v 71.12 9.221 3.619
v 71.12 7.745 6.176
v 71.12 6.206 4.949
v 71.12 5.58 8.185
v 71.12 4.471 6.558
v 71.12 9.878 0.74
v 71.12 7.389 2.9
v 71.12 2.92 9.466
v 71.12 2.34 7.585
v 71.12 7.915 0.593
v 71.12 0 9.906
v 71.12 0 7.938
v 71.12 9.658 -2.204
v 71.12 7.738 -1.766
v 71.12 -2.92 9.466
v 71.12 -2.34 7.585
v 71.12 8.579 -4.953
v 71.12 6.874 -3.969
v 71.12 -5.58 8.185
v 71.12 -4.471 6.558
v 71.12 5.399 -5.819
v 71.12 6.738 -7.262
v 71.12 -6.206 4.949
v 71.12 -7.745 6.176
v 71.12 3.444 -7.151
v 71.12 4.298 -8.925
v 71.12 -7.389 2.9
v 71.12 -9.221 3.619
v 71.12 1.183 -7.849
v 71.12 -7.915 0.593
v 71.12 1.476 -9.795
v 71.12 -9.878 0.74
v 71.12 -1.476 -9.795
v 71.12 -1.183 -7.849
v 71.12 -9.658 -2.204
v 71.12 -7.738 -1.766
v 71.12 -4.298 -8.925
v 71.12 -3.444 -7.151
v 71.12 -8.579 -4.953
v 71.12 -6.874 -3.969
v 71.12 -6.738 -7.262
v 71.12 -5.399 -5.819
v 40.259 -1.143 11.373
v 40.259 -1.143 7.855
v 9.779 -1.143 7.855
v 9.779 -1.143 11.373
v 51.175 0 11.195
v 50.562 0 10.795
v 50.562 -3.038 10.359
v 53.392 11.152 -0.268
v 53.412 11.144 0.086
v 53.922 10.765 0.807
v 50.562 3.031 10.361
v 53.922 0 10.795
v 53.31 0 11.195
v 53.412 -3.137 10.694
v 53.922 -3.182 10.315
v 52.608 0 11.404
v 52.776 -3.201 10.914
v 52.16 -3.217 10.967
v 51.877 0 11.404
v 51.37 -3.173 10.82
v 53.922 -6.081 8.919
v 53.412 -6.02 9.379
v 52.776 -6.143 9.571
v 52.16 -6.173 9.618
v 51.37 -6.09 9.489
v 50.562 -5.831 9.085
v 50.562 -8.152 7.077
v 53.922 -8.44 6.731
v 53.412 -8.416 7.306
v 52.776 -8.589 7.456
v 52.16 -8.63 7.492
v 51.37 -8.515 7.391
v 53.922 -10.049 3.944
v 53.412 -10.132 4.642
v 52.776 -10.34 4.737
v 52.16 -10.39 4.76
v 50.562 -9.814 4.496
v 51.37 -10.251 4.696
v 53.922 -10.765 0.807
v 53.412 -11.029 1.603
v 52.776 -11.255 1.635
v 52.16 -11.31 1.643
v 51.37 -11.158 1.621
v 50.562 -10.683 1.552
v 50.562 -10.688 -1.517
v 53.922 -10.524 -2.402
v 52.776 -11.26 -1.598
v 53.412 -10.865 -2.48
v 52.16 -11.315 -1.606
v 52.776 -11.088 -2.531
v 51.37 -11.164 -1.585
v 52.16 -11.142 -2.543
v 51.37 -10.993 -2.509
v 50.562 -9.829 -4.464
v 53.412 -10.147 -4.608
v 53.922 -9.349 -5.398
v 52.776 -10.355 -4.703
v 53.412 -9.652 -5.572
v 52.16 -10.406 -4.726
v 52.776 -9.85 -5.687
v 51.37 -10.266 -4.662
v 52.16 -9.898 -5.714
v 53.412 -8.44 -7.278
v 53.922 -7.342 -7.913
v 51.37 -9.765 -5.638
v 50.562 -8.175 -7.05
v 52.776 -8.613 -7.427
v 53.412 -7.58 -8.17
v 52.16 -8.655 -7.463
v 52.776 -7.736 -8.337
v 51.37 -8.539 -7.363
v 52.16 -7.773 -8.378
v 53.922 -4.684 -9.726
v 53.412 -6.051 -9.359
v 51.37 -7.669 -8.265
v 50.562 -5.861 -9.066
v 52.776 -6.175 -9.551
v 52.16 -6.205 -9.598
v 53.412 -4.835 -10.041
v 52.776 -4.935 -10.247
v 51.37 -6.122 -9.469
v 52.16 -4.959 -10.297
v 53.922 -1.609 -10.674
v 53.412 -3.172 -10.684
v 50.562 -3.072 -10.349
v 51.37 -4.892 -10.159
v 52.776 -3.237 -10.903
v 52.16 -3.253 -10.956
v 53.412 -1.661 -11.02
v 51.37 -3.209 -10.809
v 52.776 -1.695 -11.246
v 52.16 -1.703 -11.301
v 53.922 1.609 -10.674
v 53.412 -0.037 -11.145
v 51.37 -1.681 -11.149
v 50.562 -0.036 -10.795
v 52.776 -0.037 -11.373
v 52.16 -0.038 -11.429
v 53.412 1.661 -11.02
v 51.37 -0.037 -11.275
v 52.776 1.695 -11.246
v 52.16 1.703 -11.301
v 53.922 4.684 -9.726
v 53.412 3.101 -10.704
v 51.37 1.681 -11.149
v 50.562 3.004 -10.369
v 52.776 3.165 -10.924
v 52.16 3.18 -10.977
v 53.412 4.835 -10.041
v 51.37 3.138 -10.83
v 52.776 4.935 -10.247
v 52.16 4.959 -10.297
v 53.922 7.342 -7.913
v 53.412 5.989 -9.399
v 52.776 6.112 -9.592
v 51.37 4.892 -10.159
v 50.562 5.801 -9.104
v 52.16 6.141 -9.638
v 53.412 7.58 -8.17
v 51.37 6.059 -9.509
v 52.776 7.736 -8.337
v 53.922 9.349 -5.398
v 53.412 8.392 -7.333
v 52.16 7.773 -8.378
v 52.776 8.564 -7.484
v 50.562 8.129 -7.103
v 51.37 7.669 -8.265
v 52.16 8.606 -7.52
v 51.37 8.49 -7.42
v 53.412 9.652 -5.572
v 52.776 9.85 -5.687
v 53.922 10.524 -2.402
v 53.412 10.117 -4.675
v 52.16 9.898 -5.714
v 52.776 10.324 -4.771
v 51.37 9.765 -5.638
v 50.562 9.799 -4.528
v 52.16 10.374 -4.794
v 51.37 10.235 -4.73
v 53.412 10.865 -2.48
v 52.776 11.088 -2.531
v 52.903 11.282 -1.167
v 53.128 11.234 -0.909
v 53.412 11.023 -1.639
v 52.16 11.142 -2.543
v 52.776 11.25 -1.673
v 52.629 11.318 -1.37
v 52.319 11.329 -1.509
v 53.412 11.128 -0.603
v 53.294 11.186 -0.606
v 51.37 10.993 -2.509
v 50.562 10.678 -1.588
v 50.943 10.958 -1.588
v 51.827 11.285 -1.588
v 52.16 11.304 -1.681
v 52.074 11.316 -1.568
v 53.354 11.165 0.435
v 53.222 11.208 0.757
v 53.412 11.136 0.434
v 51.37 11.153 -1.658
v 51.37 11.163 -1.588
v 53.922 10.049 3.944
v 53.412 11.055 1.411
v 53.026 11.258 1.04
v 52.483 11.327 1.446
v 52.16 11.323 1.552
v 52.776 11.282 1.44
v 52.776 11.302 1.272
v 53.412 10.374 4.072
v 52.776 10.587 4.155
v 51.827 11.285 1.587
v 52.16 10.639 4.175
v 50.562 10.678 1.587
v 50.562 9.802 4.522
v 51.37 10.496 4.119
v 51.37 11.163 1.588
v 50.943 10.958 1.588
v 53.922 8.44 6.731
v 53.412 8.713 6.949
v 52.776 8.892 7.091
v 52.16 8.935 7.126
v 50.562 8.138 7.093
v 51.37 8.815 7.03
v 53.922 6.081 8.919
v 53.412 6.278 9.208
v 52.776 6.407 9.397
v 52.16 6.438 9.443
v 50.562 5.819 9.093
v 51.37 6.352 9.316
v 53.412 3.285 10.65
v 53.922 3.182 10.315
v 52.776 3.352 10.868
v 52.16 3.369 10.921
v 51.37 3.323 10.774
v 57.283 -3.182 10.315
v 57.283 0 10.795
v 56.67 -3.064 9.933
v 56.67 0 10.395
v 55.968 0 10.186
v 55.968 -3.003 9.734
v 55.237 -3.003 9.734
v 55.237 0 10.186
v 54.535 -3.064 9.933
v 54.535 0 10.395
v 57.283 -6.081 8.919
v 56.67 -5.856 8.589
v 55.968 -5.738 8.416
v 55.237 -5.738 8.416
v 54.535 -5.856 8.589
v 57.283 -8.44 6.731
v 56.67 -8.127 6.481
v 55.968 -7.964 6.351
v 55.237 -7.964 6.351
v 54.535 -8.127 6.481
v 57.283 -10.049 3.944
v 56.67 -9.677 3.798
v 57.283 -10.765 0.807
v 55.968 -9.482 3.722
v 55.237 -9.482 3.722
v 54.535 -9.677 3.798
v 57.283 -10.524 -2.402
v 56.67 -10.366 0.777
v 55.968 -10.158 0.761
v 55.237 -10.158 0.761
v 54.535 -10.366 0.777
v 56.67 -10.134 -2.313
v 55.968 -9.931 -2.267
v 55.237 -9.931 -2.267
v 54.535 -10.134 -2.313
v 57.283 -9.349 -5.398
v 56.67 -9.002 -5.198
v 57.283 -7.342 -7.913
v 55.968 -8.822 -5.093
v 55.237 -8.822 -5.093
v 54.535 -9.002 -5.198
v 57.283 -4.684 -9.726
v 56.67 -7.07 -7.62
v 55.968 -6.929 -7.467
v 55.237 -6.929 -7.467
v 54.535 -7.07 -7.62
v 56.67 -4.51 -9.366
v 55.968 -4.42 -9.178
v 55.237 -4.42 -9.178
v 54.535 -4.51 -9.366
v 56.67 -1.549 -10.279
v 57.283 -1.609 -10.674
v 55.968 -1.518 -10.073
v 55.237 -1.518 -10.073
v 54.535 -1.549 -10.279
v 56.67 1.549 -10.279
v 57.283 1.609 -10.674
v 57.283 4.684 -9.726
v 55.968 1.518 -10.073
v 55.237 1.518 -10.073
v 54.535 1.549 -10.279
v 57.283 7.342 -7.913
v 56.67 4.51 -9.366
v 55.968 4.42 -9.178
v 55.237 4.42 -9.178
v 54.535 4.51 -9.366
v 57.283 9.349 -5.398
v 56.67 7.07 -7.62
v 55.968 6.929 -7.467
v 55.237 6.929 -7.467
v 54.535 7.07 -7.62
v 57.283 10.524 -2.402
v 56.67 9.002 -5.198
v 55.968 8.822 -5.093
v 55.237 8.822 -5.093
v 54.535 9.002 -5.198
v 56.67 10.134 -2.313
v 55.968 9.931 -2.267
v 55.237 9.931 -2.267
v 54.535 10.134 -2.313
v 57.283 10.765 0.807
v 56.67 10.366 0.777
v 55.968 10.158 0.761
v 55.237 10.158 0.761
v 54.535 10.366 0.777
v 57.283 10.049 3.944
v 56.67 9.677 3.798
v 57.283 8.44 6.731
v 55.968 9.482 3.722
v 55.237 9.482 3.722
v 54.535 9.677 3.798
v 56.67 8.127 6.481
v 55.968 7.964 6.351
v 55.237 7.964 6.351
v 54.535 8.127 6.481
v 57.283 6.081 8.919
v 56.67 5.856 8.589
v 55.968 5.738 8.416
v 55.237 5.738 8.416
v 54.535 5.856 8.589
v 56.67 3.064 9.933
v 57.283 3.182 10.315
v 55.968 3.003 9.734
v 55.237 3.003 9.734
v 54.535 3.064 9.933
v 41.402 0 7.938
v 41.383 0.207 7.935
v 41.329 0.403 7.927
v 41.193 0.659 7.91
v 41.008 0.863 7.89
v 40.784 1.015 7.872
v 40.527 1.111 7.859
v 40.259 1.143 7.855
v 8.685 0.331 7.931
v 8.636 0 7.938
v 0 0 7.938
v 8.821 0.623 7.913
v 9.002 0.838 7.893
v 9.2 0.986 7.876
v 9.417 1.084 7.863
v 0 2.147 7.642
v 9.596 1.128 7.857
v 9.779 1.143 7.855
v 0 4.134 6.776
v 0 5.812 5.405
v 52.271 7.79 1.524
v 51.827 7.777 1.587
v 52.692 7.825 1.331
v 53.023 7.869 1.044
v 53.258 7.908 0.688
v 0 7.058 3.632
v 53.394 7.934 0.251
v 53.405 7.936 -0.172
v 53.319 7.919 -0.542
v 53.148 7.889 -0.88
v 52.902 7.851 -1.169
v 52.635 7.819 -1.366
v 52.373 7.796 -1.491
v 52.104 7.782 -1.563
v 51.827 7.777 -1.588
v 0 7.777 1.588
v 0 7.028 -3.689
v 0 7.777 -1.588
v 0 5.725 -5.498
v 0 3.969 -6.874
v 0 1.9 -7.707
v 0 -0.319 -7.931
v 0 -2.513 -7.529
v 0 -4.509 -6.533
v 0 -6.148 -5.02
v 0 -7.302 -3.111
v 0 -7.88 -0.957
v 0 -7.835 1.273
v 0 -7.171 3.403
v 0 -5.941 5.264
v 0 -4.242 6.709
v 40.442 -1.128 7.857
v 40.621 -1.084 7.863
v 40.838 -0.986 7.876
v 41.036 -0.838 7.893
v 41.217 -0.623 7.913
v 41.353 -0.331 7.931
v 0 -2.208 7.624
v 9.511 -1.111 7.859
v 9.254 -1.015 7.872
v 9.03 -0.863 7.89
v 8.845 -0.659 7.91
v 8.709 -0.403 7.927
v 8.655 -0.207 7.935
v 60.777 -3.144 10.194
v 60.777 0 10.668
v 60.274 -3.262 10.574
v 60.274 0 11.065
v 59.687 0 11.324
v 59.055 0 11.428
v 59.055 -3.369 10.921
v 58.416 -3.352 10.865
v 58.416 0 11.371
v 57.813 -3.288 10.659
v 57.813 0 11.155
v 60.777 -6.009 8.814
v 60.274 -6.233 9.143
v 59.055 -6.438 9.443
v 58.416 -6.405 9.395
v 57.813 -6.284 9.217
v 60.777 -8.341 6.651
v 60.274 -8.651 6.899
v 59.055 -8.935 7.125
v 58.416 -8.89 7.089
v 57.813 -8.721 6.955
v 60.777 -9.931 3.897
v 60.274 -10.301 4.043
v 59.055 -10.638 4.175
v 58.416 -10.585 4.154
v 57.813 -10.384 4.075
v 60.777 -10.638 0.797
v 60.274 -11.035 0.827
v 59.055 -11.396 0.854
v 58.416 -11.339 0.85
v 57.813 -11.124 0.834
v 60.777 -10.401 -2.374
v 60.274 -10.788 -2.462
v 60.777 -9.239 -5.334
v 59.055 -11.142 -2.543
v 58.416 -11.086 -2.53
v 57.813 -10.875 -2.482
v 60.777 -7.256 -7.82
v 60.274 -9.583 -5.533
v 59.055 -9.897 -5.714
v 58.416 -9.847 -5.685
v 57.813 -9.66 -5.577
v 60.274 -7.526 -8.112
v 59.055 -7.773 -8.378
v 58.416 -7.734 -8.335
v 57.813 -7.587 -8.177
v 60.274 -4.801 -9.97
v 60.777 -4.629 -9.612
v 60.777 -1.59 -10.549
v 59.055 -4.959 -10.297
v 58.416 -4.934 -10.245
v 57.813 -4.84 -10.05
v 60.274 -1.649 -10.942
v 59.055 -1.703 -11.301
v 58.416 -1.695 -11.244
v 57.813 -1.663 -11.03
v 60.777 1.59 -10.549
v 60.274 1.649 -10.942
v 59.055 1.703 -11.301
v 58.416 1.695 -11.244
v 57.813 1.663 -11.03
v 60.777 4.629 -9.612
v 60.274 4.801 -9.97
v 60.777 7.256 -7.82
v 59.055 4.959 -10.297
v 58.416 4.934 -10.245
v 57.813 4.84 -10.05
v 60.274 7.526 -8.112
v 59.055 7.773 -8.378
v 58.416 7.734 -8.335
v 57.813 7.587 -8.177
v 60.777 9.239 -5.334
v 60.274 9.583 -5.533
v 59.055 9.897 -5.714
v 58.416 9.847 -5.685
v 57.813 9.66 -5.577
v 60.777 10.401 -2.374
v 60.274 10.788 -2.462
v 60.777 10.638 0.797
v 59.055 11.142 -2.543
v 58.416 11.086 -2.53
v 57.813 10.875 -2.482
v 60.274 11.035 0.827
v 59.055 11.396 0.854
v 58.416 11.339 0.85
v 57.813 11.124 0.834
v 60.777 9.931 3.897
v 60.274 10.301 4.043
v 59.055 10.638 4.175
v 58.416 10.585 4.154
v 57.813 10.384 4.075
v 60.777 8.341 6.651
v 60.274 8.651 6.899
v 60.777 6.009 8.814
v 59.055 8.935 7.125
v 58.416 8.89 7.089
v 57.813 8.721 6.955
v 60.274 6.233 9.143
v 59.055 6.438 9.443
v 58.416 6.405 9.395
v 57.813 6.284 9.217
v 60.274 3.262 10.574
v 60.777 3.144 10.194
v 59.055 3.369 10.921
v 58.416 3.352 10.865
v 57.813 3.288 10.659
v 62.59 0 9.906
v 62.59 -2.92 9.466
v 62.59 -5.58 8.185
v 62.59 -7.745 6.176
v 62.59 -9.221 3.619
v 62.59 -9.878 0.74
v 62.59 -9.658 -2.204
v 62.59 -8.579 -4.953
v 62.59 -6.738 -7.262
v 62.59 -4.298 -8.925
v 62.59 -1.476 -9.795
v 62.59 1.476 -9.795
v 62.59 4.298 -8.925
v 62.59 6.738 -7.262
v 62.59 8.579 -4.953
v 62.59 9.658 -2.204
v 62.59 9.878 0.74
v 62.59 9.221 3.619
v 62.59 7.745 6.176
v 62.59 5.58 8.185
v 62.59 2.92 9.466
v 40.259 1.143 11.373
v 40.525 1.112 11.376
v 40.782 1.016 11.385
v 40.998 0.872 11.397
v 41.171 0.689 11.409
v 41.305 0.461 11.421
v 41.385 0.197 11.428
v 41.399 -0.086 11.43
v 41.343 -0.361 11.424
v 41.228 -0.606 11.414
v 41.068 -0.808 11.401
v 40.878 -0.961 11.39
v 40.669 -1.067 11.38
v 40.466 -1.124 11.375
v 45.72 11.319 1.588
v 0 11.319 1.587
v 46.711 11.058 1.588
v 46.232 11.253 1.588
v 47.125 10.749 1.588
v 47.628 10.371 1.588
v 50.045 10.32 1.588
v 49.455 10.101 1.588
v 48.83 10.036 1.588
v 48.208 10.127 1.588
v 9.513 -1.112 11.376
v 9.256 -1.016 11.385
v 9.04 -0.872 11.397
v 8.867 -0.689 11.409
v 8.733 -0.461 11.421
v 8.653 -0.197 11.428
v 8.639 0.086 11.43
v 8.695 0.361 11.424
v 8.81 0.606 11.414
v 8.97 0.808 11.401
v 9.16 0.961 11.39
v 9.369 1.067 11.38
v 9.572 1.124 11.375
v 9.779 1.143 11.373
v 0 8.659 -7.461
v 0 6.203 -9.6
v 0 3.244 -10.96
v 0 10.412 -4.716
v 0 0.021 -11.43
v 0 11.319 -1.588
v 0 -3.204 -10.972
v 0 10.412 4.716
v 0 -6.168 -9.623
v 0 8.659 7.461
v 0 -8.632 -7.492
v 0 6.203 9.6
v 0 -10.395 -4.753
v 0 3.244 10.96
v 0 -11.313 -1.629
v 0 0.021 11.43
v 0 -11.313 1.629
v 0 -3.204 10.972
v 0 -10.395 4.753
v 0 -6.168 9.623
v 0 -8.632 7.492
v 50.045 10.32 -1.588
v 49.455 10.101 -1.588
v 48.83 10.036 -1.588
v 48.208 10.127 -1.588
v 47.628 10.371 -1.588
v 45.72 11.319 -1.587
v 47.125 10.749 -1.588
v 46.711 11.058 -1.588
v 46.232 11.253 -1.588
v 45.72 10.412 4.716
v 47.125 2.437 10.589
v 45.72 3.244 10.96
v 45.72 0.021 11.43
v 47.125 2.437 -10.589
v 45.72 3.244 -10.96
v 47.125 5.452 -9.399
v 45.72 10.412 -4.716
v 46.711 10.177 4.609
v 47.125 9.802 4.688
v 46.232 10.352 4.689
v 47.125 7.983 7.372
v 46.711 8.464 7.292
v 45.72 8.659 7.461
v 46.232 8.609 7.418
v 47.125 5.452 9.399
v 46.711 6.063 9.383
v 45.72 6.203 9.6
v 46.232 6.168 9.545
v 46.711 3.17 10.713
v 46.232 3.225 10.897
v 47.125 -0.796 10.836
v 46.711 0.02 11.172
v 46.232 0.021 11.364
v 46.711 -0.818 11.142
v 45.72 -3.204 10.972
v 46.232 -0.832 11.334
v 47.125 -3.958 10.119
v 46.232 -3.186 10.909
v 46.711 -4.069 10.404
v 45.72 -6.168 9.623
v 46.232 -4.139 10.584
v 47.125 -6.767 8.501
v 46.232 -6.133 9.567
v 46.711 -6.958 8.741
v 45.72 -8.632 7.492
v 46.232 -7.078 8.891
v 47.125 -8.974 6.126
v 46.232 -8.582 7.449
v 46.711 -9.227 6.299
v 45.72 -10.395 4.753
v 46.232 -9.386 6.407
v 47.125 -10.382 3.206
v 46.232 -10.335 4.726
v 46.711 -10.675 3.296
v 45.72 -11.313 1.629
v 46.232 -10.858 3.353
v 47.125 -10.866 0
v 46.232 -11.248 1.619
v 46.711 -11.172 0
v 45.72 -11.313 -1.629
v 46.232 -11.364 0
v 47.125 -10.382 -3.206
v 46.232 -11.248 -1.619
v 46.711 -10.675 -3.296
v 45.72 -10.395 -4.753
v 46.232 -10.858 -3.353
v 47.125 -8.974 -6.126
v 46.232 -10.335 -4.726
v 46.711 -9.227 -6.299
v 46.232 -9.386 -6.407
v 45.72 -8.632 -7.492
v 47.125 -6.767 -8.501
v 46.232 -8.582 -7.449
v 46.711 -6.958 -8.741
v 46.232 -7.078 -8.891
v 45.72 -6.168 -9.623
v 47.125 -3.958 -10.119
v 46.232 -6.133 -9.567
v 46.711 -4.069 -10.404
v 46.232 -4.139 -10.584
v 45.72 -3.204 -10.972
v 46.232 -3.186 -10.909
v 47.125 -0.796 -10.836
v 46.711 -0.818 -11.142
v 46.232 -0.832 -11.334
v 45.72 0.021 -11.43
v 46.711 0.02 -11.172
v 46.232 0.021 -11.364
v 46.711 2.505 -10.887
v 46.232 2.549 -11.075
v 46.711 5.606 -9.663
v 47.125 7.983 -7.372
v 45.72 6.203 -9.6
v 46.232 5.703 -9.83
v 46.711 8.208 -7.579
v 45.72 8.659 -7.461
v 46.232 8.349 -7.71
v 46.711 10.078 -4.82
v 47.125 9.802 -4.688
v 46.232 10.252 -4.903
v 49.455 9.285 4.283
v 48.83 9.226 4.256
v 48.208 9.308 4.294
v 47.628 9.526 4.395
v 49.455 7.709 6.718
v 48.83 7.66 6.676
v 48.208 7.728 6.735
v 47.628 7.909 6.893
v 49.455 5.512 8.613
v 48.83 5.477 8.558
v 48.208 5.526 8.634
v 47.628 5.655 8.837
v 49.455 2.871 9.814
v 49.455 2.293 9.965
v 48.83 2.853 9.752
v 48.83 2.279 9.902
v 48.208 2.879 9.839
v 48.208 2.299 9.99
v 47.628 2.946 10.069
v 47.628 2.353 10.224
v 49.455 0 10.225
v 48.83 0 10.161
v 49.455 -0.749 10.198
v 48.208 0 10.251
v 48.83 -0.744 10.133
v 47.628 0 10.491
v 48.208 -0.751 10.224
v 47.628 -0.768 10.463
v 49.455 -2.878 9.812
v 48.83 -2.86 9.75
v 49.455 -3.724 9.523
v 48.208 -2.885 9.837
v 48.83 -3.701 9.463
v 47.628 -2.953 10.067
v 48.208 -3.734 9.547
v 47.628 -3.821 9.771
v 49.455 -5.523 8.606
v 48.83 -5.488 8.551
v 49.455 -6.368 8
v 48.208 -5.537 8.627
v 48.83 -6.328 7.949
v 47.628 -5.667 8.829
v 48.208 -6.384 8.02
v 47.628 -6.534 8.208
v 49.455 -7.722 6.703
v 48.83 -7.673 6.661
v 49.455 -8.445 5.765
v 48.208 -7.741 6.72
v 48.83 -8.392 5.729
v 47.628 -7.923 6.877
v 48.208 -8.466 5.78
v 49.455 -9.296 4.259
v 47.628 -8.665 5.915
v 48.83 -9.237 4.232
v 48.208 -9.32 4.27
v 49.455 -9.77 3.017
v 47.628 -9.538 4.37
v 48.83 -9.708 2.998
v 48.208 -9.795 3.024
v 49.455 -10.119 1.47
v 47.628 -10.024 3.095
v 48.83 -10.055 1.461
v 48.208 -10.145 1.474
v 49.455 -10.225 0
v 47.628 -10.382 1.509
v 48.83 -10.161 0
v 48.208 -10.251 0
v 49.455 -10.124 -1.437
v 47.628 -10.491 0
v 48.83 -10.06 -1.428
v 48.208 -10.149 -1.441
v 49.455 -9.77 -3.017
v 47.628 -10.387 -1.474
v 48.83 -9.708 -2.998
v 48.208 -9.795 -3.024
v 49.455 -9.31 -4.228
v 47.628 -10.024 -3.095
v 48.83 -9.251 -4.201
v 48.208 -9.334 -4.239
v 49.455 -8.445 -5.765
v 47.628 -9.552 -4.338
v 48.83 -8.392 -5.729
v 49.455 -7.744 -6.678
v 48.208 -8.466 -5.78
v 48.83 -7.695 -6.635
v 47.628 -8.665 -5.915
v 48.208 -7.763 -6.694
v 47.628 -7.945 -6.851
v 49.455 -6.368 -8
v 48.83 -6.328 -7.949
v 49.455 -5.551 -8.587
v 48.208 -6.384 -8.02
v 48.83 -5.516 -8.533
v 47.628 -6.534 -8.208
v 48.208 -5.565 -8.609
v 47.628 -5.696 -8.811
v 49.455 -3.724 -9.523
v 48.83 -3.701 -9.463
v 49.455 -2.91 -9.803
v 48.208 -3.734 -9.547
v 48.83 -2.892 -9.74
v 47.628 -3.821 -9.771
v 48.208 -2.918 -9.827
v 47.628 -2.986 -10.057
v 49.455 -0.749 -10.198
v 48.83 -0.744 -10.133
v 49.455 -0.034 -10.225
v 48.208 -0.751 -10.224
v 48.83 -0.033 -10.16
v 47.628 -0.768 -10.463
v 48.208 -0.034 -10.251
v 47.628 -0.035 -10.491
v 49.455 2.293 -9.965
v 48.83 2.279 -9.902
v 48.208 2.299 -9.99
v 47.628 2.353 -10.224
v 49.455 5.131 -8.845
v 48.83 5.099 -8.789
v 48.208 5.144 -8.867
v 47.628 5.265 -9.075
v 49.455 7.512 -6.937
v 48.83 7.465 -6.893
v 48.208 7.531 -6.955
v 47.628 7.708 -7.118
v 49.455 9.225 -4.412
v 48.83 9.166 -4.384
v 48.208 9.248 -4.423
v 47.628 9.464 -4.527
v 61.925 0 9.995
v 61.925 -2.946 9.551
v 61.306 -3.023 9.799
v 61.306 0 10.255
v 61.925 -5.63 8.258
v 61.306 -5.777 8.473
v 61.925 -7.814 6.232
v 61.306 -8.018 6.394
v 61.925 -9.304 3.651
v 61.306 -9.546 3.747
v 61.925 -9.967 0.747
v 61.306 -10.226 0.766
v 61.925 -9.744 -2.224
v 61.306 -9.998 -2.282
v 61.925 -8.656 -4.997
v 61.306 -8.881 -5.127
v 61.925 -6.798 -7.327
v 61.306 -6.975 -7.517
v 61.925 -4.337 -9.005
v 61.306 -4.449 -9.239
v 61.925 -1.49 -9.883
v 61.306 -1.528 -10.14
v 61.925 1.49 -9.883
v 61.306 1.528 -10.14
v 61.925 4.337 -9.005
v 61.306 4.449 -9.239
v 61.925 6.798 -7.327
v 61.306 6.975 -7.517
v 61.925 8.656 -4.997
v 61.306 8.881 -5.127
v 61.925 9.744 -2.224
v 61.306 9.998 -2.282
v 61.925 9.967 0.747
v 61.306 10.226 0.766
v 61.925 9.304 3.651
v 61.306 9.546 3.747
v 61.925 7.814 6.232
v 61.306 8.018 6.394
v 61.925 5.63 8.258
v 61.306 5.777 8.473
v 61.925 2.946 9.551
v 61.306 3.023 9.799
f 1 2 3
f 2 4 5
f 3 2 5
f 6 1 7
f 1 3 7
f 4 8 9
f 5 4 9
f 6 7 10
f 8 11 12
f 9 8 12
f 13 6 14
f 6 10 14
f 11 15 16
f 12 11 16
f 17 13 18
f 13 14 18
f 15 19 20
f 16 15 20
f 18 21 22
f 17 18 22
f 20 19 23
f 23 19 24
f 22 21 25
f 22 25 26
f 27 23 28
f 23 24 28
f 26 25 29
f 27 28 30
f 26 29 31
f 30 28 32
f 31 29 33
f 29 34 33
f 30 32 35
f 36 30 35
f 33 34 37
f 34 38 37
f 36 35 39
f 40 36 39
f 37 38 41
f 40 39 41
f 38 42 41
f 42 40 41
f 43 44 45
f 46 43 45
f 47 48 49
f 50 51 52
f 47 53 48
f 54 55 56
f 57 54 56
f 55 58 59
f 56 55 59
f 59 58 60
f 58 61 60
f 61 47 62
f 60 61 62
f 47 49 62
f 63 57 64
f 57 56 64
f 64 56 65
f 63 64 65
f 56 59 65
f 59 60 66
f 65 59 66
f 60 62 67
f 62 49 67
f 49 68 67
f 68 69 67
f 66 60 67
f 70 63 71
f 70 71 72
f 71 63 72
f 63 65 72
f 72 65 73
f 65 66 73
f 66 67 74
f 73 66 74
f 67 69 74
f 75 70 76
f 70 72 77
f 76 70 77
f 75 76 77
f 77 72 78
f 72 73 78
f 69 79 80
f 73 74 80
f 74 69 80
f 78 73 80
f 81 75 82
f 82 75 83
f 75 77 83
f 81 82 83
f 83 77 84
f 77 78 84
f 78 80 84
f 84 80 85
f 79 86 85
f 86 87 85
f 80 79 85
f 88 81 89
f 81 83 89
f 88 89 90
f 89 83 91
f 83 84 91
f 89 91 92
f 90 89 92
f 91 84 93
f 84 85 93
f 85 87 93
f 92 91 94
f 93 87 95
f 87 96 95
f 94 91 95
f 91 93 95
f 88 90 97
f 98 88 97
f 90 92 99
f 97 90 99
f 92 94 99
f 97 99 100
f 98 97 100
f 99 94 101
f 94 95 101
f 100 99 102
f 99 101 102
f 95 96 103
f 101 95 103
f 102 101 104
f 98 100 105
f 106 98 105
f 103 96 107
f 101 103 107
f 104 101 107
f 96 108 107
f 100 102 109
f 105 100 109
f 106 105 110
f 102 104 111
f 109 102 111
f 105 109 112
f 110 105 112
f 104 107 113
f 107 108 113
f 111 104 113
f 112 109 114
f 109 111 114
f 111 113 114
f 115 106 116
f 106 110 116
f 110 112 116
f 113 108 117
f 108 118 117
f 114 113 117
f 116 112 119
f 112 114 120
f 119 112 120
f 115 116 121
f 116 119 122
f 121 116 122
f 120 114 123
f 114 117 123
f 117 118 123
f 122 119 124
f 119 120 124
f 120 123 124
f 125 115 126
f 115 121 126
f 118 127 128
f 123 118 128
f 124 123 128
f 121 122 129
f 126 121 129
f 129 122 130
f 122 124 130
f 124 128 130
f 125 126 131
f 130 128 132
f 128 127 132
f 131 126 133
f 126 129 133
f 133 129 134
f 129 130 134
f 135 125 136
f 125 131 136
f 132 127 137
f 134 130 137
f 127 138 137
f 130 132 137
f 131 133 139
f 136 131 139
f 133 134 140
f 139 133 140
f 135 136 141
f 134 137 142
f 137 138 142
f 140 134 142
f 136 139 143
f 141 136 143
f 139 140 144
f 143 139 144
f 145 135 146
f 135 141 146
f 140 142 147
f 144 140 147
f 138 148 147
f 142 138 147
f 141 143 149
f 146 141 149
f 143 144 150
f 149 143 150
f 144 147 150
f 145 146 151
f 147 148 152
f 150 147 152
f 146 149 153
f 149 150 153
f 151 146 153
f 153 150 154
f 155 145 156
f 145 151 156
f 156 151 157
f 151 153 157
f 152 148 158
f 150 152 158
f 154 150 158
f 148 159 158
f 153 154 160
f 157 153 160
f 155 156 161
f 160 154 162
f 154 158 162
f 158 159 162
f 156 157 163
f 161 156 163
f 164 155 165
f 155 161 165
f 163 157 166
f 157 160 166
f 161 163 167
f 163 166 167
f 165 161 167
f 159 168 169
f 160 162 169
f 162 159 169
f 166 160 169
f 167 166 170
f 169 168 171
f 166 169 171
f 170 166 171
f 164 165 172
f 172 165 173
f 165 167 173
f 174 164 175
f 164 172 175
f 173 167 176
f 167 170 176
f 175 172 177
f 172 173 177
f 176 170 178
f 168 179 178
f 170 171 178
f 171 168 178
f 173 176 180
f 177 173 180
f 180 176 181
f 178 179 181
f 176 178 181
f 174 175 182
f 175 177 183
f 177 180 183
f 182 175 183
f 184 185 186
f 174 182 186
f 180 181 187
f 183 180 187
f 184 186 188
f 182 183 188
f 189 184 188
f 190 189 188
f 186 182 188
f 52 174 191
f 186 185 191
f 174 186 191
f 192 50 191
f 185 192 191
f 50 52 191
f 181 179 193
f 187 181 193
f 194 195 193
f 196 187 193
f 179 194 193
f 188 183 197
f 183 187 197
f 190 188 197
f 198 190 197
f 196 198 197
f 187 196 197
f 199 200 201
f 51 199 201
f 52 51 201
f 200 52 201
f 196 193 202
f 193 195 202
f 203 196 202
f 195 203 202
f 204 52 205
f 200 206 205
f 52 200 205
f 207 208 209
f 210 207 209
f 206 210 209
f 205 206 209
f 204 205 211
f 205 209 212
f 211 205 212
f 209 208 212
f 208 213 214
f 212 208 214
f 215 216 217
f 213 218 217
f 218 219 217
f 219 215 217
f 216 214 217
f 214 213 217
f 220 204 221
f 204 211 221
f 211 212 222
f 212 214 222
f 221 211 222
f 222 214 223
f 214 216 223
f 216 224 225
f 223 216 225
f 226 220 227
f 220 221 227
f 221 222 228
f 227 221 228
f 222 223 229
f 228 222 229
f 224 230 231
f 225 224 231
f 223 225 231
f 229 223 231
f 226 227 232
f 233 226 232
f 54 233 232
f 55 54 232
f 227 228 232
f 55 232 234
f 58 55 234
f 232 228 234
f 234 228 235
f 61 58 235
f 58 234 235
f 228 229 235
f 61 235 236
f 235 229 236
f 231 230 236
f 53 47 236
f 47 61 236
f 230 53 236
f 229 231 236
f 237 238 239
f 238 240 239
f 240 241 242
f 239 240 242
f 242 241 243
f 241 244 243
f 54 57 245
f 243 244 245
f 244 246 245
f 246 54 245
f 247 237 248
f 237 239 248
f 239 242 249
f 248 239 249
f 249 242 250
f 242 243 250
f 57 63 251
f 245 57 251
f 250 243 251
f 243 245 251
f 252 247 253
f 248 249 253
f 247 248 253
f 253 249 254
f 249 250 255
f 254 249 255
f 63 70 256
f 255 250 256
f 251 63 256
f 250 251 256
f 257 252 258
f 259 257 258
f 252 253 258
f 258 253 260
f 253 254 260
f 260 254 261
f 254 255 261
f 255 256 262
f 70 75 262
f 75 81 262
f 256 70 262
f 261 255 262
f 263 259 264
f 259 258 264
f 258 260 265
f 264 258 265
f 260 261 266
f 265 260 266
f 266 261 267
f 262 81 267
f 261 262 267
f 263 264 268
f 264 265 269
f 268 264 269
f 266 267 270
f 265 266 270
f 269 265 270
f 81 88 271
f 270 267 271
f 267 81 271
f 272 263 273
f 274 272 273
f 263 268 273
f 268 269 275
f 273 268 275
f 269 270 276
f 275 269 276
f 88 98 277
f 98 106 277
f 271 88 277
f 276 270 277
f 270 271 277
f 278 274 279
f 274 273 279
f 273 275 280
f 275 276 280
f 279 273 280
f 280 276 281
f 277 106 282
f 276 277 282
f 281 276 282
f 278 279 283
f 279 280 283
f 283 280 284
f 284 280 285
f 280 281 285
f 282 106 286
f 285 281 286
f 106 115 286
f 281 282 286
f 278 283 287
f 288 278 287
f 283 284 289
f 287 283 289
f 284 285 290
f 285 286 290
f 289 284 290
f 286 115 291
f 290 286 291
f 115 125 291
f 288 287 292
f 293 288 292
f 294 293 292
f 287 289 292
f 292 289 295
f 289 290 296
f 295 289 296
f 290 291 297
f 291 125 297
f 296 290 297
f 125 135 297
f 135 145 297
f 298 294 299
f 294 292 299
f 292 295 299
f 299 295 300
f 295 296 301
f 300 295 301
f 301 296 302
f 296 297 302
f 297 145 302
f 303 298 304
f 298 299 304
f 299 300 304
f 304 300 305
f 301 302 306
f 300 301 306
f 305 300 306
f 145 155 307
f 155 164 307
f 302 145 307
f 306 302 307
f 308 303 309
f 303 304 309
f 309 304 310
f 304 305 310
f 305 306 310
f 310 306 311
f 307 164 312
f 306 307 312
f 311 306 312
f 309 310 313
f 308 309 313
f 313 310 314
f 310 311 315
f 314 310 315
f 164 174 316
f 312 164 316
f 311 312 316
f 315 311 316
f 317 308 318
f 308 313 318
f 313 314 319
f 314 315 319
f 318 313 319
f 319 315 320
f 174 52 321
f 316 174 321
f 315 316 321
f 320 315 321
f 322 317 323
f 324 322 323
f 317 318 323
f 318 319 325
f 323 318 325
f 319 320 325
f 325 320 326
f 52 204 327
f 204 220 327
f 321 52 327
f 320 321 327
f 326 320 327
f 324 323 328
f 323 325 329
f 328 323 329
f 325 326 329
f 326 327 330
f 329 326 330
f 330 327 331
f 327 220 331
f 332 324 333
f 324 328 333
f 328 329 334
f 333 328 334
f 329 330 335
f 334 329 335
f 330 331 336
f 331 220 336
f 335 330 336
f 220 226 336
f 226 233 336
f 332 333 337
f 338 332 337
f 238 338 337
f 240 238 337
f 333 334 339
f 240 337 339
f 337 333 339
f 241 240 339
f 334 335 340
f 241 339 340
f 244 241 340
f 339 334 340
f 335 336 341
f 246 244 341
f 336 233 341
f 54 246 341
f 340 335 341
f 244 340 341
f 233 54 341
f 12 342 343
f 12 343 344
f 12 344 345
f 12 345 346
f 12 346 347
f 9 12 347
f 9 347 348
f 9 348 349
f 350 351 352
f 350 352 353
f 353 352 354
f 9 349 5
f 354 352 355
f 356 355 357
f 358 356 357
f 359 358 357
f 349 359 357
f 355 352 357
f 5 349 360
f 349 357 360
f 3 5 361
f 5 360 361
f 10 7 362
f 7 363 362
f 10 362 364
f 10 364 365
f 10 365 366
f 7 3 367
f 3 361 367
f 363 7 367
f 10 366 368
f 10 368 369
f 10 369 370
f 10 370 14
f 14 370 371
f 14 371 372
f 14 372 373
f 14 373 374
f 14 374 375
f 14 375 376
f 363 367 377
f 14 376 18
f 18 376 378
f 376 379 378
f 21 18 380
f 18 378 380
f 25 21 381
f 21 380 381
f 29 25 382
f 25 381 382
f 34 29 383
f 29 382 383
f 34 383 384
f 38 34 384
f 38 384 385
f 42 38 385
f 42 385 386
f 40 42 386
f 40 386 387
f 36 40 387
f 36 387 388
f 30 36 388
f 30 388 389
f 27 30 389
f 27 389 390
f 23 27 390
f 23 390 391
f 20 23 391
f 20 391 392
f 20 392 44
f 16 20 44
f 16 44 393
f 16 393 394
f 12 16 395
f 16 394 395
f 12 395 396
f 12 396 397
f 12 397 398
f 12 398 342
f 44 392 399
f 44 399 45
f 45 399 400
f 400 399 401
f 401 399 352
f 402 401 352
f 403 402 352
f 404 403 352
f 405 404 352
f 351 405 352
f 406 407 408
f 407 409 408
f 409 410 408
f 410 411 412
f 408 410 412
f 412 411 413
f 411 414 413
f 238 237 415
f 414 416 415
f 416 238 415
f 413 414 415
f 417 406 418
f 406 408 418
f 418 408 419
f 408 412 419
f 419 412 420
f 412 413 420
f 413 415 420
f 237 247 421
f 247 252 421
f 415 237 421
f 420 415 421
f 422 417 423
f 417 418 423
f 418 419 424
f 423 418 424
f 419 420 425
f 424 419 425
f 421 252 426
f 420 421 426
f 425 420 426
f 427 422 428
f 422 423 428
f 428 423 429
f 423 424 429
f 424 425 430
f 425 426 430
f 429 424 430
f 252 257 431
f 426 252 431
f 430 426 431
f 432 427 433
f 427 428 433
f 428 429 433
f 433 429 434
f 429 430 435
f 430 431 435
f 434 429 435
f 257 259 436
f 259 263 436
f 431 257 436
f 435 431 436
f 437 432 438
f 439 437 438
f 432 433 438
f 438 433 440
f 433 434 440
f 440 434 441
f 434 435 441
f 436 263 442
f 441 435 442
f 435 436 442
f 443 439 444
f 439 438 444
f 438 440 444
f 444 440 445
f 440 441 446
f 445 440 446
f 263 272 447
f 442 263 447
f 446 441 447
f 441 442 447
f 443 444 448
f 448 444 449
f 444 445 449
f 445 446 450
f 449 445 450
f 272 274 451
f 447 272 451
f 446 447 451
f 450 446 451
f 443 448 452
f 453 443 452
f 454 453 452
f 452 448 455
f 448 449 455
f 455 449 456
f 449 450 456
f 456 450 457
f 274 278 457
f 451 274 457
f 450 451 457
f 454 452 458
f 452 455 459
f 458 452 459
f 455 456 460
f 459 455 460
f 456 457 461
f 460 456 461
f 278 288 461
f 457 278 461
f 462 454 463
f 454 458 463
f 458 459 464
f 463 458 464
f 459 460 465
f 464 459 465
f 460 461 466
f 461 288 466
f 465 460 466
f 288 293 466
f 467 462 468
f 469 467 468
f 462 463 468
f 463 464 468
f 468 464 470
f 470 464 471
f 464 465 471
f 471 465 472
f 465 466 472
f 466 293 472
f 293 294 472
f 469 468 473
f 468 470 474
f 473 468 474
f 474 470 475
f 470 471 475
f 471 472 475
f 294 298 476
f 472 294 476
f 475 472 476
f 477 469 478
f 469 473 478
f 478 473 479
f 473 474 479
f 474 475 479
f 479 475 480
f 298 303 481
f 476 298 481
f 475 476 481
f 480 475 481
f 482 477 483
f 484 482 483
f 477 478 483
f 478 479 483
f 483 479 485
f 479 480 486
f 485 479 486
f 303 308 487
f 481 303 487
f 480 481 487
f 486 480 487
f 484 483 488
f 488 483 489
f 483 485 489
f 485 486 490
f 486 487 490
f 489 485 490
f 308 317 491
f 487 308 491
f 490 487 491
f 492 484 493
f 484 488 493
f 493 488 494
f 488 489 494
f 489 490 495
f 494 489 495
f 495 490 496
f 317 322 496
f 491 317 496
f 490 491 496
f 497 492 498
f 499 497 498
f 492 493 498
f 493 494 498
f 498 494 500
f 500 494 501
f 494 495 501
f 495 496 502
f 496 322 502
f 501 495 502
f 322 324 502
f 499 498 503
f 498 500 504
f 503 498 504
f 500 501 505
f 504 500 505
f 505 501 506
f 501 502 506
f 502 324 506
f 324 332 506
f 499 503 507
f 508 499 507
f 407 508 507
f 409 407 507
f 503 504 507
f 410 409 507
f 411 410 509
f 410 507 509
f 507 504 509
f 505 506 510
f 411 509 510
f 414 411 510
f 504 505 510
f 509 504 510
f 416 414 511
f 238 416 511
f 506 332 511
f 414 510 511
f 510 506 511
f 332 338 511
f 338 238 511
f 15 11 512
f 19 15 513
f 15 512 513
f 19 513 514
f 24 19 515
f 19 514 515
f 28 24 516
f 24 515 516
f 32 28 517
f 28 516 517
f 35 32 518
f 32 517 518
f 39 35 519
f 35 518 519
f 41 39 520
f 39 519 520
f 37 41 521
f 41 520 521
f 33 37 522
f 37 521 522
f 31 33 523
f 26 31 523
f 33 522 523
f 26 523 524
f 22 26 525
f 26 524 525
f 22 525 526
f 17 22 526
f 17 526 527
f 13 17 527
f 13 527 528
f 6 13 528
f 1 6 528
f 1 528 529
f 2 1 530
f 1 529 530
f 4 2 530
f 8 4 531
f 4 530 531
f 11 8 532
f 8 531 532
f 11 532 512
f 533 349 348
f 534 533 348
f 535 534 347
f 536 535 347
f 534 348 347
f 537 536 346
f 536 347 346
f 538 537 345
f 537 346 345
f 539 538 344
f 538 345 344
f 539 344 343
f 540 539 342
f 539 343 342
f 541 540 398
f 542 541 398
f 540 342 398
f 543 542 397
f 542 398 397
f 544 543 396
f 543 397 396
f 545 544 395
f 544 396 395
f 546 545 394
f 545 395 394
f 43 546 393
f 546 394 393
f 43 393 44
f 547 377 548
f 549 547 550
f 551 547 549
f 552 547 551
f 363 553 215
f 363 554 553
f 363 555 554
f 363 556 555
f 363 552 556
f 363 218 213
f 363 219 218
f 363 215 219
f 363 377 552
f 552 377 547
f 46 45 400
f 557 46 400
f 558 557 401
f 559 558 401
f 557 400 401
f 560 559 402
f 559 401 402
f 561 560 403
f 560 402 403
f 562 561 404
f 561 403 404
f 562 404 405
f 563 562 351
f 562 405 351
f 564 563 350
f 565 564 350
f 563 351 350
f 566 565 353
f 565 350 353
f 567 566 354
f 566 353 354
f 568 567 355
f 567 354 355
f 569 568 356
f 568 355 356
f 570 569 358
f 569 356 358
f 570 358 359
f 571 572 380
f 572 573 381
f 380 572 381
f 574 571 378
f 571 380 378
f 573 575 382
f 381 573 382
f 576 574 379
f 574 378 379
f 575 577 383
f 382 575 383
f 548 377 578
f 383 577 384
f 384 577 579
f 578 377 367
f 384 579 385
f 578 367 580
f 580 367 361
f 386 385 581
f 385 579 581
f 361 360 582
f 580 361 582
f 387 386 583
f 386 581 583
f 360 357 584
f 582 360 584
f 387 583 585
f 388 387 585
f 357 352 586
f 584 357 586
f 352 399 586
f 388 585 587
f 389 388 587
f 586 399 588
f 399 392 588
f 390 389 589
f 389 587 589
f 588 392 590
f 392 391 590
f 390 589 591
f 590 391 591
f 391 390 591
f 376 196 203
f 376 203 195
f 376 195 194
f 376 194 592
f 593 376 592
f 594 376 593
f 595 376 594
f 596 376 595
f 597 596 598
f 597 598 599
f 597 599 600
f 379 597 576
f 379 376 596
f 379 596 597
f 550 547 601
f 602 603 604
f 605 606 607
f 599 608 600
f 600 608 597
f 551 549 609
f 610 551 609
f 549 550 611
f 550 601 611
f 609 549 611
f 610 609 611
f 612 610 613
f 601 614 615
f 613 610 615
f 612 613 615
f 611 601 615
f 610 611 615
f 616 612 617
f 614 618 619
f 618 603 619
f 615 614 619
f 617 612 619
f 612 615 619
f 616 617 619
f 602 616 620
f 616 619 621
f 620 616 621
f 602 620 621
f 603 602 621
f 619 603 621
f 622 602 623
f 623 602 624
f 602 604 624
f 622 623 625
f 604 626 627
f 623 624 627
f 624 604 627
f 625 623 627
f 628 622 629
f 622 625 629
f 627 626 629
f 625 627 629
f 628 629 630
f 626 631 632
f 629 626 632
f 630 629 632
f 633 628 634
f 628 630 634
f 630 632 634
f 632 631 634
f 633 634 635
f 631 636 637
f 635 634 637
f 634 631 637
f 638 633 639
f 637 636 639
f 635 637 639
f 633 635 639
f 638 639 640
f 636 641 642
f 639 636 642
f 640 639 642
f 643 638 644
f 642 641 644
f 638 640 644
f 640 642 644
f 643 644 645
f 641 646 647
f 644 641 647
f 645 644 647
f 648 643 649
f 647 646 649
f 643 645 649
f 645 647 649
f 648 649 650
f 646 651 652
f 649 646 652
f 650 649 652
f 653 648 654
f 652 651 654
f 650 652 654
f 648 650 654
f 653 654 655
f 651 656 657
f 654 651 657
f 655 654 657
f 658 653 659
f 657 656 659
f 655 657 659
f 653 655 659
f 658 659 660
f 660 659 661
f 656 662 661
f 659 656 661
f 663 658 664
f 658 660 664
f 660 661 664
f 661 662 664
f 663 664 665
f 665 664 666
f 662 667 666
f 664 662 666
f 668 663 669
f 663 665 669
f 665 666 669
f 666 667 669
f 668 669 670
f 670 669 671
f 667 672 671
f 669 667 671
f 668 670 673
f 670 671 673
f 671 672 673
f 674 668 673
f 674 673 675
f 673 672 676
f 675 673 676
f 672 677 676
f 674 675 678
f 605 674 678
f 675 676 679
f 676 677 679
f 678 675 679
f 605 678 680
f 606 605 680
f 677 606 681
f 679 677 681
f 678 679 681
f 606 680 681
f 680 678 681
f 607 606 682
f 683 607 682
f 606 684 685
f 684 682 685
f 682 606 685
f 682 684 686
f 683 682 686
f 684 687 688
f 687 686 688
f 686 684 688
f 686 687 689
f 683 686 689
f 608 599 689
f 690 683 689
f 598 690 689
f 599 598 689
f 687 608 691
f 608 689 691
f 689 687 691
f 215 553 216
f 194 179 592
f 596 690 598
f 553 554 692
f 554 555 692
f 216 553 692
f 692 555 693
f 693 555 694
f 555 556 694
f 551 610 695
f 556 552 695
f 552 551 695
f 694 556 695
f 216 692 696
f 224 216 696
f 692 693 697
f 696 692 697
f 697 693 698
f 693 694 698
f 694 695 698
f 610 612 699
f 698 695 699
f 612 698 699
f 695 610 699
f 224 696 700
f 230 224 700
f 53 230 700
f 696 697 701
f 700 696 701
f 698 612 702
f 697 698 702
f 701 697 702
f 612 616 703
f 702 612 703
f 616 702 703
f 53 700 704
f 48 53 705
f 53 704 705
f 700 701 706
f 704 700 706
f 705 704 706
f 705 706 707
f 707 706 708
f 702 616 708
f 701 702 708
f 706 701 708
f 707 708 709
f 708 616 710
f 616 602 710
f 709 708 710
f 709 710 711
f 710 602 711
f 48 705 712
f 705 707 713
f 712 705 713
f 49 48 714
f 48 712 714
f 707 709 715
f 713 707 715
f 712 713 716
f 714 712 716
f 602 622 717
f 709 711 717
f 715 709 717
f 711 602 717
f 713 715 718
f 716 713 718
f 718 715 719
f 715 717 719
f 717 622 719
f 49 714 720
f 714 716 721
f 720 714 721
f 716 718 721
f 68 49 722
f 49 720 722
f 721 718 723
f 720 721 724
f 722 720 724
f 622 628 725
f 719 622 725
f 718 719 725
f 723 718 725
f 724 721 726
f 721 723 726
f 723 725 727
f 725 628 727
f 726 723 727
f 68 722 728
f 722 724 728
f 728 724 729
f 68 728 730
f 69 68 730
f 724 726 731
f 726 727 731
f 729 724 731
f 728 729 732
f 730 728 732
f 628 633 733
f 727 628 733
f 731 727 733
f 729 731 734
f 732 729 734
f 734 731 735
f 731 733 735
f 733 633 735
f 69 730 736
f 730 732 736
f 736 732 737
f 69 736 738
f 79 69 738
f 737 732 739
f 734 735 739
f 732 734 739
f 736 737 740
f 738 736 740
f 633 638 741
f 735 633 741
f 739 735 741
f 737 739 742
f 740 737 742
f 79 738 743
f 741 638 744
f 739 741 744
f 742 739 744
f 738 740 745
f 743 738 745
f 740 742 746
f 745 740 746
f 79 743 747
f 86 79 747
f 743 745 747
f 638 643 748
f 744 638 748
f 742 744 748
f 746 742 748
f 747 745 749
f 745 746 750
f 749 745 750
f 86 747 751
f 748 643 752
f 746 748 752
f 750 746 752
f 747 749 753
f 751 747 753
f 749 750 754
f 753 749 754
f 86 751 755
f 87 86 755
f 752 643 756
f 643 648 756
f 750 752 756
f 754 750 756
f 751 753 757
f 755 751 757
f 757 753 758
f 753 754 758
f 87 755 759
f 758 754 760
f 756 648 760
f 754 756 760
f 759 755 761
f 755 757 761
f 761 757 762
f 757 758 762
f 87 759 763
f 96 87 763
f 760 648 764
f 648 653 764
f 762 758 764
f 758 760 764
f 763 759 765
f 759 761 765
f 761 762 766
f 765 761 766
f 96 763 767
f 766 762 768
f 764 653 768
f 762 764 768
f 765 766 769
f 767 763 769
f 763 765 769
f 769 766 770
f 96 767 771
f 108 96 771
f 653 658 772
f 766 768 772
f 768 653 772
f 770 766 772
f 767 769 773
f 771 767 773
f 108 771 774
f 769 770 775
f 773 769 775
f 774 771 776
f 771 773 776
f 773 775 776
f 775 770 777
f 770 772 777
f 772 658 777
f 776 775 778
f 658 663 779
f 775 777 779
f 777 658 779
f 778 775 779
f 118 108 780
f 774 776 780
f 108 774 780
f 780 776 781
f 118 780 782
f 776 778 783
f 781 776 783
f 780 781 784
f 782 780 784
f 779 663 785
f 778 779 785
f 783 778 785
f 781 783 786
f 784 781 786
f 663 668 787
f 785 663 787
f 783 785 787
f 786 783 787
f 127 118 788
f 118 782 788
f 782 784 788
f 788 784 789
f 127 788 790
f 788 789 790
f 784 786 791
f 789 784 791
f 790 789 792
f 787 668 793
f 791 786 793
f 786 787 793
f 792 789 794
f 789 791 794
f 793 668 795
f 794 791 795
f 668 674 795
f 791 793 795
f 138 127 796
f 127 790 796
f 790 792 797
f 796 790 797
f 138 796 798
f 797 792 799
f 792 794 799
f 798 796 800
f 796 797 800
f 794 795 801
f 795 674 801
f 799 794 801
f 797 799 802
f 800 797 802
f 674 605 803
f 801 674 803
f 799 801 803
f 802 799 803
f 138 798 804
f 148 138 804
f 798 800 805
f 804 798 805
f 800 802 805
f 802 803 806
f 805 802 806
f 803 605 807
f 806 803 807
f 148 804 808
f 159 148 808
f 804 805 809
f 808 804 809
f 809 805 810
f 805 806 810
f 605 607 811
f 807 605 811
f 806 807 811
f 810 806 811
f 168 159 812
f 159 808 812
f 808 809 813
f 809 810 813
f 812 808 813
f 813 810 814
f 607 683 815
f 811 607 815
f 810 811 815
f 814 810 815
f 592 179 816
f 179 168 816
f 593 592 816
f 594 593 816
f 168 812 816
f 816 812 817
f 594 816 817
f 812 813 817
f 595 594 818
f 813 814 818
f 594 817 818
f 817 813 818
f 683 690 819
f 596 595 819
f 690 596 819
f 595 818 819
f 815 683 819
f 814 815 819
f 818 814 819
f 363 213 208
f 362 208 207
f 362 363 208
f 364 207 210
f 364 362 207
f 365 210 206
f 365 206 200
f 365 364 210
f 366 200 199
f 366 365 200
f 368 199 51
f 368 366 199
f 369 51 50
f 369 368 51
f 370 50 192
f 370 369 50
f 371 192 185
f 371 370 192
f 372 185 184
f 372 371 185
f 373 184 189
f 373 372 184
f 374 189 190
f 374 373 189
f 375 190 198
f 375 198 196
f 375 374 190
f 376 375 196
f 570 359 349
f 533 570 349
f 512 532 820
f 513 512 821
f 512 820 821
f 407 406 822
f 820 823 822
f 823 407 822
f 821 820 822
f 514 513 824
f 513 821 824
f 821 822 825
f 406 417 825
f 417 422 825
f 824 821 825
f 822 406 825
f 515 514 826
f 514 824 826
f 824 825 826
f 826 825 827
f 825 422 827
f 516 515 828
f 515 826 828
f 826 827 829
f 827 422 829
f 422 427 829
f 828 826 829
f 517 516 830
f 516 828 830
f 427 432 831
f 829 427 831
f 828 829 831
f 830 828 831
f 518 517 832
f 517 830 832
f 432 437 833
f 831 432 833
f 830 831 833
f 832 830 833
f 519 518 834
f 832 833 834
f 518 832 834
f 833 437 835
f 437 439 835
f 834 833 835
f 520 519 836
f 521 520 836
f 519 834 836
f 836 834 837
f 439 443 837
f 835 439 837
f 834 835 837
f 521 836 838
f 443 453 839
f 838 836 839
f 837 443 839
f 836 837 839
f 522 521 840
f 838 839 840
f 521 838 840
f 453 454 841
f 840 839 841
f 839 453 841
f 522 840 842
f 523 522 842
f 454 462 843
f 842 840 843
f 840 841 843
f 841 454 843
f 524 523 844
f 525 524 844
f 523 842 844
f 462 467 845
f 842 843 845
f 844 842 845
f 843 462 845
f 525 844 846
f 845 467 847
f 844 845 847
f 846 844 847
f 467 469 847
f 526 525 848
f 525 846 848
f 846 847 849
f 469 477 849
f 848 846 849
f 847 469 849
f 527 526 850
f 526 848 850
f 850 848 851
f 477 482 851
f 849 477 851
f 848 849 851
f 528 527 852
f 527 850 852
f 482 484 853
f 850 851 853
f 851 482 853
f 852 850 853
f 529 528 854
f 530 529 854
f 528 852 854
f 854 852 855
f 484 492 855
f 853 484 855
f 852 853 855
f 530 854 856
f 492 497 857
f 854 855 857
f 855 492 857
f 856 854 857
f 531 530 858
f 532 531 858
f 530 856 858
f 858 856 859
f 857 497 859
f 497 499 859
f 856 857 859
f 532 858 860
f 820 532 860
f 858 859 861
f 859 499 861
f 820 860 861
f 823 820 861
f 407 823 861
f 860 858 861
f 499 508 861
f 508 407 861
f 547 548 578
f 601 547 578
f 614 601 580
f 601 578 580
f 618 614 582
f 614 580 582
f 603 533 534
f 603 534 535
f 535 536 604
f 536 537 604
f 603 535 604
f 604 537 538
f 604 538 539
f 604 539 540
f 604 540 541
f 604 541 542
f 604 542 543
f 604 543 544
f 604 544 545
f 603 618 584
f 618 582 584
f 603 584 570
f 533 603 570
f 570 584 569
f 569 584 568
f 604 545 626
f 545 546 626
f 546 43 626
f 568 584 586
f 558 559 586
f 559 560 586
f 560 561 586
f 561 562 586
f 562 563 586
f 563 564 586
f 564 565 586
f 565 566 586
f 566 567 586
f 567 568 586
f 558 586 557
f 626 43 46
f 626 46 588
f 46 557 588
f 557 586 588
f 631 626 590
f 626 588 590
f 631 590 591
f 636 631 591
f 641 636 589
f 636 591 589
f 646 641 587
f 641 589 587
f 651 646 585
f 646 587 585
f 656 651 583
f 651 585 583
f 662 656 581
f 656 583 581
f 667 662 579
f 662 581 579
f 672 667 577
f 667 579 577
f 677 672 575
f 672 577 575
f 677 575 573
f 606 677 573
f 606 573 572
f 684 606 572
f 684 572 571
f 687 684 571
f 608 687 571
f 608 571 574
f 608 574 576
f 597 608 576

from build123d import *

# Parameters (mm, degrees)
CUT_EXTRUDE1_DEPTH           = 73.933834429
CUT_EXTRUDE2_DEPTH           = 73.933834429
F_5_8_0_625_DIAMETER_HOLE1_D = 15.875


with BuildPart() as part:
    # Sketch1 → Revolve1 (revolve)
    with BuildSketch(Plane.XY, mode=Mode.PRIVATE) as revolve1_sk:
        with BuildLine():
            Line((0, 0), (71.12, 0))
            Line((71.12, 0), (71.12, 9.906))
            Line((71.12, 9.906), (62.590432635, 9.906))
            ThreePointArc((62.590432635, 9.906), (61.606694865, 10.104235708), (60.776509814, 10.668))
            ThreePointArc((60.776509814, 10.668), (59.054850711, 11.428323739), (57.282534911, 10.795))
            ThreePointArc((57.282534911, 10.795), (55.602482828, 10.16), (53.922430745, 10.795))
            ThreePointArc((53.922430745, 10.795), (52.242378663, 11.43), (50.56232658, 10.795))
            ThreePointArc((50.56232658, 10.795), (48.830141803, 10.16053506), (47.125455332, 10.865555556))
            ThreePointArc((47.125455332, 10.865555556), (46.477281688, 11.283616198), (45.72, 11.43))
            Line((45.72, 11.43), (0, 11.43))
            Line((0, 11.43), (0, 0))
        make_face()
    revolve(revolve1_sk.sketch.rotate(Axis((0, 0, 0), (1, 0, 0)), 90), axis=Axis((0, 0, 0), (1, 0, 0)))

    # Sketch7 → Cut-Extrude1 (cut, through all)
    with BuildSketch(Plane.XY):
        with BuildLine():
            Line((9.779, 1.143), (40.259, 1.143))
            ThreePointArc((40.259, 1.143), (41.402, 0), (40.259, -1.143))
            Line((40.259, -1.143), (9.779, -1.143))
            ThreePointArc((9.779, -1.143), (8.636, 0), (9.779, 1.143))
        make_face()
    extrude(amount=CUT_EXTRUDE1_DEPTH, mode=Mode.SUBTRACT)

    # Sketch8 → Cut-Extrude2 (cut, through all)
    with BuildSketch(Plane(origin=(0, 0, 0), x_dir=(1, 0, 0), z_dir=(0, 1, 0))):
        with BuildLine():
            Line((0, -1.5875), (51.826930745, -1.5875))
            ThreePointArc((51.826930745, -1.5875), (53.414430745, 0), (51.826930745, 1.5875))
            Line((51.826930745, 1.5875), (0, 1.5875))
            Line((0, 1.5875), (0, -1.5875))
        make_face()
    extrude(amount=CUT_EXTRUDE2_DEPTH, mode=Mode.SUBTRACT)

    # 5/8 (0.625) Diameter Hole1 (through all)
    with Locations(Plane(origin=(71.12, 0, 0), x_dir=(0, 0, -1), z_dir=(1, 0, 0))):
        with Locations((0, 0)):
            Hole(F_5_8_0_625_DIAMETER_HOLE1_D / 2)


solid = part.part
